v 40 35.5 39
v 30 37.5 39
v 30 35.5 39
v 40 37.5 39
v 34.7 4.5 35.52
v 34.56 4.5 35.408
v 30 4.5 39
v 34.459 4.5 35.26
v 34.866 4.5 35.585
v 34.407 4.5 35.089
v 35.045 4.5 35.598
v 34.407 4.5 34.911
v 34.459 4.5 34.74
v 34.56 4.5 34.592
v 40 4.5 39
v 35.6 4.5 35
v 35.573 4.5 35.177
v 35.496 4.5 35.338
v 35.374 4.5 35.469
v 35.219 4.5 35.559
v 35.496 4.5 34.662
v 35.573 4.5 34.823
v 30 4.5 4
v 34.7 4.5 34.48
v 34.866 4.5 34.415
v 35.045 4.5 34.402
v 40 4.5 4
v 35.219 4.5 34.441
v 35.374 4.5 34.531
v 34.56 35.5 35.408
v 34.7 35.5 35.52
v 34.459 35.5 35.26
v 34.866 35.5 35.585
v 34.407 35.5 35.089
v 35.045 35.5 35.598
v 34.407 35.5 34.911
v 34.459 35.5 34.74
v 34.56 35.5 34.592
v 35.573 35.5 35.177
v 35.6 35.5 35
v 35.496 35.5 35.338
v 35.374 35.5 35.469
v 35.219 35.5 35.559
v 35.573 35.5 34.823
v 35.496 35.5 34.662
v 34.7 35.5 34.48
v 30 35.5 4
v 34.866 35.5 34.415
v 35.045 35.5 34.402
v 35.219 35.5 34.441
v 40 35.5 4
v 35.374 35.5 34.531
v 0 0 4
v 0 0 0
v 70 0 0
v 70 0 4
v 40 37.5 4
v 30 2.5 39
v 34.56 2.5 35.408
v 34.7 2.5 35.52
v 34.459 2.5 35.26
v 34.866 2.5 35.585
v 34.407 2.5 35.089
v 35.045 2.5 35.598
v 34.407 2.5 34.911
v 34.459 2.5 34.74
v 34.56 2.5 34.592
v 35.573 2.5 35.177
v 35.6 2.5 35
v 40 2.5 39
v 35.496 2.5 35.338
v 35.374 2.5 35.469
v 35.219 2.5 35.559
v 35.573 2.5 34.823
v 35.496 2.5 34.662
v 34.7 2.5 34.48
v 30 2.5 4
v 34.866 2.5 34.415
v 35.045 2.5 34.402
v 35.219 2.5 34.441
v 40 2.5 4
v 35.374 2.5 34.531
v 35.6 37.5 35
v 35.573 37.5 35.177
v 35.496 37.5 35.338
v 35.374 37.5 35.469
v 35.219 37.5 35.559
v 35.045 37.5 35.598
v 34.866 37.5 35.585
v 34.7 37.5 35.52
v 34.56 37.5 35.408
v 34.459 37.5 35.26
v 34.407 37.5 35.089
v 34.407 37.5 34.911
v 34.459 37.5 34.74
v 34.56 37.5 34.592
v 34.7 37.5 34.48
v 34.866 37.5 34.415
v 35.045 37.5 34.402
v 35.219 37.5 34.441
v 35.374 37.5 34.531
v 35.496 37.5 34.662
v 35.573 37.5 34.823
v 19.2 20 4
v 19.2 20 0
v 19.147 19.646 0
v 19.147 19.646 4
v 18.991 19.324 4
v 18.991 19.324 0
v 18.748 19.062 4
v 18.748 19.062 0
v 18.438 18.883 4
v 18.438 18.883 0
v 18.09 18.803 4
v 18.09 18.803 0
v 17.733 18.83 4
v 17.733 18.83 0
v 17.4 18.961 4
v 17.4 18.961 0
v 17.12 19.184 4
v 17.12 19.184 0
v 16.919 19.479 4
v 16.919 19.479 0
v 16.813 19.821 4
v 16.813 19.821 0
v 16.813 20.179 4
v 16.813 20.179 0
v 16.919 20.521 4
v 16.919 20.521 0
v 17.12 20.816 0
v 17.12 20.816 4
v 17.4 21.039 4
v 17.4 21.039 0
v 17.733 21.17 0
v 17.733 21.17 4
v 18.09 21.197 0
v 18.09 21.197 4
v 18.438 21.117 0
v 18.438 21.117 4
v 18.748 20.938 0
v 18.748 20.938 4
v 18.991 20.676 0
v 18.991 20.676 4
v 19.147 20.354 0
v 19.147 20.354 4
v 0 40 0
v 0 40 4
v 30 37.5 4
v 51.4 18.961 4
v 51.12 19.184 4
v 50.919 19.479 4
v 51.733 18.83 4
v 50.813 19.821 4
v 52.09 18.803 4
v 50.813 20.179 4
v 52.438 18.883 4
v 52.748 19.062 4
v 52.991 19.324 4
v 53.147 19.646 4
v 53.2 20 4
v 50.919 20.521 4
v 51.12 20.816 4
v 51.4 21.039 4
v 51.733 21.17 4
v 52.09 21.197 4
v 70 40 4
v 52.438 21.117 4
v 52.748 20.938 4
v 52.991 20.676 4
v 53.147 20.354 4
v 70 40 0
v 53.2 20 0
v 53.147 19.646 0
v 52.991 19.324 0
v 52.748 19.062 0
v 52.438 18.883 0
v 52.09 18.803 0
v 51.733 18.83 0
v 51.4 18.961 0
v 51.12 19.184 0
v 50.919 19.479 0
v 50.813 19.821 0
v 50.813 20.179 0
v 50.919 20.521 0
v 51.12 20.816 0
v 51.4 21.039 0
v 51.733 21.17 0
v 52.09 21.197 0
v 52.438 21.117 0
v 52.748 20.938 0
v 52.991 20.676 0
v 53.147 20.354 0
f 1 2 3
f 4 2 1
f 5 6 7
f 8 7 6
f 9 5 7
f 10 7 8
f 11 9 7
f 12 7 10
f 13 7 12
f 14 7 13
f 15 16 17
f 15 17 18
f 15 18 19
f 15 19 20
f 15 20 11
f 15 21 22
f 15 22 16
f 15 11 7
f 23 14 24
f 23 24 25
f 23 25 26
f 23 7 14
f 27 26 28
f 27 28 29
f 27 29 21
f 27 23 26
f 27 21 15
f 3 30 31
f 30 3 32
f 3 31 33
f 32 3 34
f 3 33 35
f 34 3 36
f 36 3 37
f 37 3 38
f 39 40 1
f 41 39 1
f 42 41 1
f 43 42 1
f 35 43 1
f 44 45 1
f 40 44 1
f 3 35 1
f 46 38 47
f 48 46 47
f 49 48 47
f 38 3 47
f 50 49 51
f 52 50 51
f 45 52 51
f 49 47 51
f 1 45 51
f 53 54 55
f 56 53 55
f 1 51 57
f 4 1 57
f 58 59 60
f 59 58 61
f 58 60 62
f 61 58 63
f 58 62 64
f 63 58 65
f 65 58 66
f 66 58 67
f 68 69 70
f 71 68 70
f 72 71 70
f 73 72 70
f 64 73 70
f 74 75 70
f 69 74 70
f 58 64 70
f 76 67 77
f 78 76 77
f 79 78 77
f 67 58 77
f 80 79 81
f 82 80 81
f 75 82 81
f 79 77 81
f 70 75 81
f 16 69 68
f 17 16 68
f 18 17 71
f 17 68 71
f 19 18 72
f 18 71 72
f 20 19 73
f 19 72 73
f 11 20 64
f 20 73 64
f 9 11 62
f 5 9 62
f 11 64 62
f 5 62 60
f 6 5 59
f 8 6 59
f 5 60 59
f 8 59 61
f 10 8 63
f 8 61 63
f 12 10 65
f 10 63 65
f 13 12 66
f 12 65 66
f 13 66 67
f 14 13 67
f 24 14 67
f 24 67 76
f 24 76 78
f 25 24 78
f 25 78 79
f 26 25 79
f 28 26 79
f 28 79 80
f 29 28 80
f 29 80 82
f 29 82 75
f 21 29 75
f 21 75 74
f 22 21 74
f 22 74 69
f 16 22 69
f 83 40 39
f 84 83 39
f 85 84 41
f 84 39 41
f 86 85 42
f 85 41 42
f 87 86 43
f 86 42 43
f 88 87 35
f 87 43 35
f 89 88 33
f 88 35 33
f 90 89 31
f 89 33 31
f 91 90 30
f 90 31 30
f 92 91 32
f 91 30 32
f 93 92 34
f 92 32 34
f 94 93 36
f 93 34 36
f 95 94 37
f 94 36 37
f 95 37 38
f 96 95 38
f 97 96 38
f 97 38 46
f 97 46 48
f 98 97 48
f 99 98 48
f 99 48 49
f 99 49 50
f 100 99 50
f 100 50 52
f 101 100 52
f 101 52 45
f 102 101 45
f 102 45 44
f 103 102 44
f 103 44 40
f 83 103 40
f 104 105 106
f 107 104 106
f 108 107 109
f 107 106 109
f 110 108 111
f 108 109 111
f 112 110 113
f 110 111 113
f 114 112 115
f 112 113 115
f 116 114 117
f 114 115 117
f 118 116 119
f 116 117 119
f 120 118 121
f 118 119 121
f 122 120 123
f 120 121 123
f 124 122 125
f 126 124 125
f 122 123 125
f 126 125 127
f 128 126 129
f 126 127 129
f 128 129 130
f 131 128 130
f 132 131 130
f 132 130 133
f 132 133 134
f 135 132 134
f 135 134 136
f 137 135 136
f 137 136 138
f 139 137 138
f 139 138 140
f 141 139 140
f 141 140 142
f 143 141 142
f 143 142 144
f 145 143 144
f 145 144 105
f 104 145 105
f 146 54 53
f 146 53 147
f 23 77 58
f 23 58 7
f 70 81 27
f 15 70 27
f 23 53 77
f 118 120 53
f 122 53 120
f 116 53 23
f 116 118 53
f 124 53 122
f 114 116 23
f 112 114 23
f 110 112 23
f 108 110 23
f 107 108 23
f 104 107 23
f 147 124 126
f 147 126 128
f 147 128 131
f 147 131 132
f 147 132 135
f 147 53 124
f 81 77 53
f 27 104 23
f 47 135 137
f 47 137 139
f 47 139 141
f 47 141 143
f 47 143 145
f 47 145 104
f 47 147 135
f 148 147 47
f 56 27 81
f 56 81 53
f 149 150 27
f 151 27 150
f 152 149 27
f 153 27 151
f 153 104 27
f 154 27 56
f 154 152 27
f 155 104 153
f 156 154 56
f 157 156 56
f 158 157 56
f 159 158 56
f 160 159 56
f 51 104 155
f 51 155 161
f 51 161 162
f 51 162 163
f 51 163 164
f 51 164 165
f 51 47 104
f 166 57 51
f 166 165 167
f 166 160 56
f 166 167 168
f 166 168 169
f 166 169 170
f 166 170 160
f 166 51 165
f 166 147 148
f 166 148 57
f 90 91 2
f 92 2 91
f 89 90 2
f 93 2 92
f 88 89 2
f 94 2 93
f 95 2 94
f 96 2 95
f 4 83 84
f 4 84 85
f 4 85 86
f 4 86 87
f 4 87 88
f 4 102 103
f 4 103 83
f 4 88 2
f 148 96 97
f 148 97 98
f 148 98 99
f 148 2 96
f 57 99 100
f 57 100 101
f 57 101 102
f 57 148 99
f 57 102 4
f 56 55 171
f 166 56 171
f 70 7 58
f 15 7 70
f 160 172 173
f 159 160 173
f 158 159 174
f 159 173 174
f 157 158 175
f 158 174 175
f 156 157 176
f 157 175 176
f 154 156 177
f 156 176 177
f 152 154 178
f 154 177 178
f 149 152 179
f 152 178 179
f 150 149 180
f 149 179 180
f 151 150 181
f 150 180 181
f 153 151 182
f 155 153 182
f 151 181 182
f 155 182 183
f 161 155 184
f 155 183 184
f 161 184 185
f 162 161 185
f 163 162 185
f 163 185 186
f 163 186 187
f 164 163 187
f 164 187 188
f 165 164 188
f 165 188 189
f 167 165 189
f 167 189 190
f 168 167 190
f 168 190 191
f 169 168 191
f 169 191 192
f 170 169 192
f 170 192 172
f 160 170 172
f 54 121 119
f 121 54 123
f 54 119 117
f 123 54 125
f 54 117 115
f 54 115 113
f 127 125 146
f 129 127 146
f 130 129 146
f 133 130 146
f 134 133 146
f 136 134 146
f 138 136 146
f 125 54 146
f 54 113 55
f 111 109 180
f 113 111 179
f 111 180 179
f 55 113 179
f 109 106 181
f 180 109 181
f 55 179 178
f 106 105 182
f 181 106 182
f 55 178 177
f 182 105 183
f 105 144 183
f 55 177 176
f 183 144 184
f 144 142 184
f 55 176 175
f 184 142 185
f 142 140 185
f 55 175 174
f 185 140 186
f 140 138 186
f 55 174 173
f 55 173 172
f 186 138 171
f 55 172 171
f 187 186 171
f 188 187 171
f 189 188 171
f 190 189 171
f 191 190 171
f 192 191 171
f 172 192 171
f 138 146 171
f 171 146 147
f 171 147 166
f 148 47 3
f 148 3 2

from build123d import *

# Parameters (mm, degrees)
SKETCH_W        = 70
SKETCH_H        = 40
PAD_DEPTH       = 4
SKETCH001_W     = 10
SKETCH001_H     = 2
PAD001_DEPTH    = 35
SKETCH002_R     = 0.6
POCKET_DEPTH    = 37
SKETCH003_R     = 1.2
POCKET001_DEPTH = 5


with BuildPart() as part:
    # Sketch → Pad (new body)
    with BuildSketch(Plane.XY):
        with Locations((35, 20)):
            Rectangle(SKETCH_W, SKETCH_H)
    extrude(amount=PAD_DEPTH)

    # Sketch001 (on Face6 of Pad) → Pad001 (join)
    with BuildSketch(Plane.XY.offset(4)):
        with Locations((35, 36.5)):
            Rectangle(SKETCH001_W, SKETCH001_H)
        with Locations((35, 3.5)):
            Rectangle(SKETCH001_W, SKETCH001_H)
    extrude(amount=PAD001_DEPTH)

    # Sketch002 (on Face8 of Pad001) → Pocket (cut)
    with BuildSketch(Plane.XZ.offset(-2.5)):
        with Locations((35, 35)):
            Circle(SKETCH002_R)
    extrude(amount=-POCKET_DEPTH, mode=Mode.SUBTRACT)

    # Sketch003 (on Face4 of Pocket) → Pocket001 (cut)
    with BuildSketch(Plane(origin=(0, 0, 0), x_dir=(1, 0, 0), z_dir=(0, 0, -1))):
        with Locations((18, -20)):
            Circle(SKETCH003_R)
        with Locations((52, -20)):
            Circle(SKETCH003_R)
    extrude(amount=-POCKET001_DEPTH, mode=Mode.SUBTRACT)


solid = part.part
